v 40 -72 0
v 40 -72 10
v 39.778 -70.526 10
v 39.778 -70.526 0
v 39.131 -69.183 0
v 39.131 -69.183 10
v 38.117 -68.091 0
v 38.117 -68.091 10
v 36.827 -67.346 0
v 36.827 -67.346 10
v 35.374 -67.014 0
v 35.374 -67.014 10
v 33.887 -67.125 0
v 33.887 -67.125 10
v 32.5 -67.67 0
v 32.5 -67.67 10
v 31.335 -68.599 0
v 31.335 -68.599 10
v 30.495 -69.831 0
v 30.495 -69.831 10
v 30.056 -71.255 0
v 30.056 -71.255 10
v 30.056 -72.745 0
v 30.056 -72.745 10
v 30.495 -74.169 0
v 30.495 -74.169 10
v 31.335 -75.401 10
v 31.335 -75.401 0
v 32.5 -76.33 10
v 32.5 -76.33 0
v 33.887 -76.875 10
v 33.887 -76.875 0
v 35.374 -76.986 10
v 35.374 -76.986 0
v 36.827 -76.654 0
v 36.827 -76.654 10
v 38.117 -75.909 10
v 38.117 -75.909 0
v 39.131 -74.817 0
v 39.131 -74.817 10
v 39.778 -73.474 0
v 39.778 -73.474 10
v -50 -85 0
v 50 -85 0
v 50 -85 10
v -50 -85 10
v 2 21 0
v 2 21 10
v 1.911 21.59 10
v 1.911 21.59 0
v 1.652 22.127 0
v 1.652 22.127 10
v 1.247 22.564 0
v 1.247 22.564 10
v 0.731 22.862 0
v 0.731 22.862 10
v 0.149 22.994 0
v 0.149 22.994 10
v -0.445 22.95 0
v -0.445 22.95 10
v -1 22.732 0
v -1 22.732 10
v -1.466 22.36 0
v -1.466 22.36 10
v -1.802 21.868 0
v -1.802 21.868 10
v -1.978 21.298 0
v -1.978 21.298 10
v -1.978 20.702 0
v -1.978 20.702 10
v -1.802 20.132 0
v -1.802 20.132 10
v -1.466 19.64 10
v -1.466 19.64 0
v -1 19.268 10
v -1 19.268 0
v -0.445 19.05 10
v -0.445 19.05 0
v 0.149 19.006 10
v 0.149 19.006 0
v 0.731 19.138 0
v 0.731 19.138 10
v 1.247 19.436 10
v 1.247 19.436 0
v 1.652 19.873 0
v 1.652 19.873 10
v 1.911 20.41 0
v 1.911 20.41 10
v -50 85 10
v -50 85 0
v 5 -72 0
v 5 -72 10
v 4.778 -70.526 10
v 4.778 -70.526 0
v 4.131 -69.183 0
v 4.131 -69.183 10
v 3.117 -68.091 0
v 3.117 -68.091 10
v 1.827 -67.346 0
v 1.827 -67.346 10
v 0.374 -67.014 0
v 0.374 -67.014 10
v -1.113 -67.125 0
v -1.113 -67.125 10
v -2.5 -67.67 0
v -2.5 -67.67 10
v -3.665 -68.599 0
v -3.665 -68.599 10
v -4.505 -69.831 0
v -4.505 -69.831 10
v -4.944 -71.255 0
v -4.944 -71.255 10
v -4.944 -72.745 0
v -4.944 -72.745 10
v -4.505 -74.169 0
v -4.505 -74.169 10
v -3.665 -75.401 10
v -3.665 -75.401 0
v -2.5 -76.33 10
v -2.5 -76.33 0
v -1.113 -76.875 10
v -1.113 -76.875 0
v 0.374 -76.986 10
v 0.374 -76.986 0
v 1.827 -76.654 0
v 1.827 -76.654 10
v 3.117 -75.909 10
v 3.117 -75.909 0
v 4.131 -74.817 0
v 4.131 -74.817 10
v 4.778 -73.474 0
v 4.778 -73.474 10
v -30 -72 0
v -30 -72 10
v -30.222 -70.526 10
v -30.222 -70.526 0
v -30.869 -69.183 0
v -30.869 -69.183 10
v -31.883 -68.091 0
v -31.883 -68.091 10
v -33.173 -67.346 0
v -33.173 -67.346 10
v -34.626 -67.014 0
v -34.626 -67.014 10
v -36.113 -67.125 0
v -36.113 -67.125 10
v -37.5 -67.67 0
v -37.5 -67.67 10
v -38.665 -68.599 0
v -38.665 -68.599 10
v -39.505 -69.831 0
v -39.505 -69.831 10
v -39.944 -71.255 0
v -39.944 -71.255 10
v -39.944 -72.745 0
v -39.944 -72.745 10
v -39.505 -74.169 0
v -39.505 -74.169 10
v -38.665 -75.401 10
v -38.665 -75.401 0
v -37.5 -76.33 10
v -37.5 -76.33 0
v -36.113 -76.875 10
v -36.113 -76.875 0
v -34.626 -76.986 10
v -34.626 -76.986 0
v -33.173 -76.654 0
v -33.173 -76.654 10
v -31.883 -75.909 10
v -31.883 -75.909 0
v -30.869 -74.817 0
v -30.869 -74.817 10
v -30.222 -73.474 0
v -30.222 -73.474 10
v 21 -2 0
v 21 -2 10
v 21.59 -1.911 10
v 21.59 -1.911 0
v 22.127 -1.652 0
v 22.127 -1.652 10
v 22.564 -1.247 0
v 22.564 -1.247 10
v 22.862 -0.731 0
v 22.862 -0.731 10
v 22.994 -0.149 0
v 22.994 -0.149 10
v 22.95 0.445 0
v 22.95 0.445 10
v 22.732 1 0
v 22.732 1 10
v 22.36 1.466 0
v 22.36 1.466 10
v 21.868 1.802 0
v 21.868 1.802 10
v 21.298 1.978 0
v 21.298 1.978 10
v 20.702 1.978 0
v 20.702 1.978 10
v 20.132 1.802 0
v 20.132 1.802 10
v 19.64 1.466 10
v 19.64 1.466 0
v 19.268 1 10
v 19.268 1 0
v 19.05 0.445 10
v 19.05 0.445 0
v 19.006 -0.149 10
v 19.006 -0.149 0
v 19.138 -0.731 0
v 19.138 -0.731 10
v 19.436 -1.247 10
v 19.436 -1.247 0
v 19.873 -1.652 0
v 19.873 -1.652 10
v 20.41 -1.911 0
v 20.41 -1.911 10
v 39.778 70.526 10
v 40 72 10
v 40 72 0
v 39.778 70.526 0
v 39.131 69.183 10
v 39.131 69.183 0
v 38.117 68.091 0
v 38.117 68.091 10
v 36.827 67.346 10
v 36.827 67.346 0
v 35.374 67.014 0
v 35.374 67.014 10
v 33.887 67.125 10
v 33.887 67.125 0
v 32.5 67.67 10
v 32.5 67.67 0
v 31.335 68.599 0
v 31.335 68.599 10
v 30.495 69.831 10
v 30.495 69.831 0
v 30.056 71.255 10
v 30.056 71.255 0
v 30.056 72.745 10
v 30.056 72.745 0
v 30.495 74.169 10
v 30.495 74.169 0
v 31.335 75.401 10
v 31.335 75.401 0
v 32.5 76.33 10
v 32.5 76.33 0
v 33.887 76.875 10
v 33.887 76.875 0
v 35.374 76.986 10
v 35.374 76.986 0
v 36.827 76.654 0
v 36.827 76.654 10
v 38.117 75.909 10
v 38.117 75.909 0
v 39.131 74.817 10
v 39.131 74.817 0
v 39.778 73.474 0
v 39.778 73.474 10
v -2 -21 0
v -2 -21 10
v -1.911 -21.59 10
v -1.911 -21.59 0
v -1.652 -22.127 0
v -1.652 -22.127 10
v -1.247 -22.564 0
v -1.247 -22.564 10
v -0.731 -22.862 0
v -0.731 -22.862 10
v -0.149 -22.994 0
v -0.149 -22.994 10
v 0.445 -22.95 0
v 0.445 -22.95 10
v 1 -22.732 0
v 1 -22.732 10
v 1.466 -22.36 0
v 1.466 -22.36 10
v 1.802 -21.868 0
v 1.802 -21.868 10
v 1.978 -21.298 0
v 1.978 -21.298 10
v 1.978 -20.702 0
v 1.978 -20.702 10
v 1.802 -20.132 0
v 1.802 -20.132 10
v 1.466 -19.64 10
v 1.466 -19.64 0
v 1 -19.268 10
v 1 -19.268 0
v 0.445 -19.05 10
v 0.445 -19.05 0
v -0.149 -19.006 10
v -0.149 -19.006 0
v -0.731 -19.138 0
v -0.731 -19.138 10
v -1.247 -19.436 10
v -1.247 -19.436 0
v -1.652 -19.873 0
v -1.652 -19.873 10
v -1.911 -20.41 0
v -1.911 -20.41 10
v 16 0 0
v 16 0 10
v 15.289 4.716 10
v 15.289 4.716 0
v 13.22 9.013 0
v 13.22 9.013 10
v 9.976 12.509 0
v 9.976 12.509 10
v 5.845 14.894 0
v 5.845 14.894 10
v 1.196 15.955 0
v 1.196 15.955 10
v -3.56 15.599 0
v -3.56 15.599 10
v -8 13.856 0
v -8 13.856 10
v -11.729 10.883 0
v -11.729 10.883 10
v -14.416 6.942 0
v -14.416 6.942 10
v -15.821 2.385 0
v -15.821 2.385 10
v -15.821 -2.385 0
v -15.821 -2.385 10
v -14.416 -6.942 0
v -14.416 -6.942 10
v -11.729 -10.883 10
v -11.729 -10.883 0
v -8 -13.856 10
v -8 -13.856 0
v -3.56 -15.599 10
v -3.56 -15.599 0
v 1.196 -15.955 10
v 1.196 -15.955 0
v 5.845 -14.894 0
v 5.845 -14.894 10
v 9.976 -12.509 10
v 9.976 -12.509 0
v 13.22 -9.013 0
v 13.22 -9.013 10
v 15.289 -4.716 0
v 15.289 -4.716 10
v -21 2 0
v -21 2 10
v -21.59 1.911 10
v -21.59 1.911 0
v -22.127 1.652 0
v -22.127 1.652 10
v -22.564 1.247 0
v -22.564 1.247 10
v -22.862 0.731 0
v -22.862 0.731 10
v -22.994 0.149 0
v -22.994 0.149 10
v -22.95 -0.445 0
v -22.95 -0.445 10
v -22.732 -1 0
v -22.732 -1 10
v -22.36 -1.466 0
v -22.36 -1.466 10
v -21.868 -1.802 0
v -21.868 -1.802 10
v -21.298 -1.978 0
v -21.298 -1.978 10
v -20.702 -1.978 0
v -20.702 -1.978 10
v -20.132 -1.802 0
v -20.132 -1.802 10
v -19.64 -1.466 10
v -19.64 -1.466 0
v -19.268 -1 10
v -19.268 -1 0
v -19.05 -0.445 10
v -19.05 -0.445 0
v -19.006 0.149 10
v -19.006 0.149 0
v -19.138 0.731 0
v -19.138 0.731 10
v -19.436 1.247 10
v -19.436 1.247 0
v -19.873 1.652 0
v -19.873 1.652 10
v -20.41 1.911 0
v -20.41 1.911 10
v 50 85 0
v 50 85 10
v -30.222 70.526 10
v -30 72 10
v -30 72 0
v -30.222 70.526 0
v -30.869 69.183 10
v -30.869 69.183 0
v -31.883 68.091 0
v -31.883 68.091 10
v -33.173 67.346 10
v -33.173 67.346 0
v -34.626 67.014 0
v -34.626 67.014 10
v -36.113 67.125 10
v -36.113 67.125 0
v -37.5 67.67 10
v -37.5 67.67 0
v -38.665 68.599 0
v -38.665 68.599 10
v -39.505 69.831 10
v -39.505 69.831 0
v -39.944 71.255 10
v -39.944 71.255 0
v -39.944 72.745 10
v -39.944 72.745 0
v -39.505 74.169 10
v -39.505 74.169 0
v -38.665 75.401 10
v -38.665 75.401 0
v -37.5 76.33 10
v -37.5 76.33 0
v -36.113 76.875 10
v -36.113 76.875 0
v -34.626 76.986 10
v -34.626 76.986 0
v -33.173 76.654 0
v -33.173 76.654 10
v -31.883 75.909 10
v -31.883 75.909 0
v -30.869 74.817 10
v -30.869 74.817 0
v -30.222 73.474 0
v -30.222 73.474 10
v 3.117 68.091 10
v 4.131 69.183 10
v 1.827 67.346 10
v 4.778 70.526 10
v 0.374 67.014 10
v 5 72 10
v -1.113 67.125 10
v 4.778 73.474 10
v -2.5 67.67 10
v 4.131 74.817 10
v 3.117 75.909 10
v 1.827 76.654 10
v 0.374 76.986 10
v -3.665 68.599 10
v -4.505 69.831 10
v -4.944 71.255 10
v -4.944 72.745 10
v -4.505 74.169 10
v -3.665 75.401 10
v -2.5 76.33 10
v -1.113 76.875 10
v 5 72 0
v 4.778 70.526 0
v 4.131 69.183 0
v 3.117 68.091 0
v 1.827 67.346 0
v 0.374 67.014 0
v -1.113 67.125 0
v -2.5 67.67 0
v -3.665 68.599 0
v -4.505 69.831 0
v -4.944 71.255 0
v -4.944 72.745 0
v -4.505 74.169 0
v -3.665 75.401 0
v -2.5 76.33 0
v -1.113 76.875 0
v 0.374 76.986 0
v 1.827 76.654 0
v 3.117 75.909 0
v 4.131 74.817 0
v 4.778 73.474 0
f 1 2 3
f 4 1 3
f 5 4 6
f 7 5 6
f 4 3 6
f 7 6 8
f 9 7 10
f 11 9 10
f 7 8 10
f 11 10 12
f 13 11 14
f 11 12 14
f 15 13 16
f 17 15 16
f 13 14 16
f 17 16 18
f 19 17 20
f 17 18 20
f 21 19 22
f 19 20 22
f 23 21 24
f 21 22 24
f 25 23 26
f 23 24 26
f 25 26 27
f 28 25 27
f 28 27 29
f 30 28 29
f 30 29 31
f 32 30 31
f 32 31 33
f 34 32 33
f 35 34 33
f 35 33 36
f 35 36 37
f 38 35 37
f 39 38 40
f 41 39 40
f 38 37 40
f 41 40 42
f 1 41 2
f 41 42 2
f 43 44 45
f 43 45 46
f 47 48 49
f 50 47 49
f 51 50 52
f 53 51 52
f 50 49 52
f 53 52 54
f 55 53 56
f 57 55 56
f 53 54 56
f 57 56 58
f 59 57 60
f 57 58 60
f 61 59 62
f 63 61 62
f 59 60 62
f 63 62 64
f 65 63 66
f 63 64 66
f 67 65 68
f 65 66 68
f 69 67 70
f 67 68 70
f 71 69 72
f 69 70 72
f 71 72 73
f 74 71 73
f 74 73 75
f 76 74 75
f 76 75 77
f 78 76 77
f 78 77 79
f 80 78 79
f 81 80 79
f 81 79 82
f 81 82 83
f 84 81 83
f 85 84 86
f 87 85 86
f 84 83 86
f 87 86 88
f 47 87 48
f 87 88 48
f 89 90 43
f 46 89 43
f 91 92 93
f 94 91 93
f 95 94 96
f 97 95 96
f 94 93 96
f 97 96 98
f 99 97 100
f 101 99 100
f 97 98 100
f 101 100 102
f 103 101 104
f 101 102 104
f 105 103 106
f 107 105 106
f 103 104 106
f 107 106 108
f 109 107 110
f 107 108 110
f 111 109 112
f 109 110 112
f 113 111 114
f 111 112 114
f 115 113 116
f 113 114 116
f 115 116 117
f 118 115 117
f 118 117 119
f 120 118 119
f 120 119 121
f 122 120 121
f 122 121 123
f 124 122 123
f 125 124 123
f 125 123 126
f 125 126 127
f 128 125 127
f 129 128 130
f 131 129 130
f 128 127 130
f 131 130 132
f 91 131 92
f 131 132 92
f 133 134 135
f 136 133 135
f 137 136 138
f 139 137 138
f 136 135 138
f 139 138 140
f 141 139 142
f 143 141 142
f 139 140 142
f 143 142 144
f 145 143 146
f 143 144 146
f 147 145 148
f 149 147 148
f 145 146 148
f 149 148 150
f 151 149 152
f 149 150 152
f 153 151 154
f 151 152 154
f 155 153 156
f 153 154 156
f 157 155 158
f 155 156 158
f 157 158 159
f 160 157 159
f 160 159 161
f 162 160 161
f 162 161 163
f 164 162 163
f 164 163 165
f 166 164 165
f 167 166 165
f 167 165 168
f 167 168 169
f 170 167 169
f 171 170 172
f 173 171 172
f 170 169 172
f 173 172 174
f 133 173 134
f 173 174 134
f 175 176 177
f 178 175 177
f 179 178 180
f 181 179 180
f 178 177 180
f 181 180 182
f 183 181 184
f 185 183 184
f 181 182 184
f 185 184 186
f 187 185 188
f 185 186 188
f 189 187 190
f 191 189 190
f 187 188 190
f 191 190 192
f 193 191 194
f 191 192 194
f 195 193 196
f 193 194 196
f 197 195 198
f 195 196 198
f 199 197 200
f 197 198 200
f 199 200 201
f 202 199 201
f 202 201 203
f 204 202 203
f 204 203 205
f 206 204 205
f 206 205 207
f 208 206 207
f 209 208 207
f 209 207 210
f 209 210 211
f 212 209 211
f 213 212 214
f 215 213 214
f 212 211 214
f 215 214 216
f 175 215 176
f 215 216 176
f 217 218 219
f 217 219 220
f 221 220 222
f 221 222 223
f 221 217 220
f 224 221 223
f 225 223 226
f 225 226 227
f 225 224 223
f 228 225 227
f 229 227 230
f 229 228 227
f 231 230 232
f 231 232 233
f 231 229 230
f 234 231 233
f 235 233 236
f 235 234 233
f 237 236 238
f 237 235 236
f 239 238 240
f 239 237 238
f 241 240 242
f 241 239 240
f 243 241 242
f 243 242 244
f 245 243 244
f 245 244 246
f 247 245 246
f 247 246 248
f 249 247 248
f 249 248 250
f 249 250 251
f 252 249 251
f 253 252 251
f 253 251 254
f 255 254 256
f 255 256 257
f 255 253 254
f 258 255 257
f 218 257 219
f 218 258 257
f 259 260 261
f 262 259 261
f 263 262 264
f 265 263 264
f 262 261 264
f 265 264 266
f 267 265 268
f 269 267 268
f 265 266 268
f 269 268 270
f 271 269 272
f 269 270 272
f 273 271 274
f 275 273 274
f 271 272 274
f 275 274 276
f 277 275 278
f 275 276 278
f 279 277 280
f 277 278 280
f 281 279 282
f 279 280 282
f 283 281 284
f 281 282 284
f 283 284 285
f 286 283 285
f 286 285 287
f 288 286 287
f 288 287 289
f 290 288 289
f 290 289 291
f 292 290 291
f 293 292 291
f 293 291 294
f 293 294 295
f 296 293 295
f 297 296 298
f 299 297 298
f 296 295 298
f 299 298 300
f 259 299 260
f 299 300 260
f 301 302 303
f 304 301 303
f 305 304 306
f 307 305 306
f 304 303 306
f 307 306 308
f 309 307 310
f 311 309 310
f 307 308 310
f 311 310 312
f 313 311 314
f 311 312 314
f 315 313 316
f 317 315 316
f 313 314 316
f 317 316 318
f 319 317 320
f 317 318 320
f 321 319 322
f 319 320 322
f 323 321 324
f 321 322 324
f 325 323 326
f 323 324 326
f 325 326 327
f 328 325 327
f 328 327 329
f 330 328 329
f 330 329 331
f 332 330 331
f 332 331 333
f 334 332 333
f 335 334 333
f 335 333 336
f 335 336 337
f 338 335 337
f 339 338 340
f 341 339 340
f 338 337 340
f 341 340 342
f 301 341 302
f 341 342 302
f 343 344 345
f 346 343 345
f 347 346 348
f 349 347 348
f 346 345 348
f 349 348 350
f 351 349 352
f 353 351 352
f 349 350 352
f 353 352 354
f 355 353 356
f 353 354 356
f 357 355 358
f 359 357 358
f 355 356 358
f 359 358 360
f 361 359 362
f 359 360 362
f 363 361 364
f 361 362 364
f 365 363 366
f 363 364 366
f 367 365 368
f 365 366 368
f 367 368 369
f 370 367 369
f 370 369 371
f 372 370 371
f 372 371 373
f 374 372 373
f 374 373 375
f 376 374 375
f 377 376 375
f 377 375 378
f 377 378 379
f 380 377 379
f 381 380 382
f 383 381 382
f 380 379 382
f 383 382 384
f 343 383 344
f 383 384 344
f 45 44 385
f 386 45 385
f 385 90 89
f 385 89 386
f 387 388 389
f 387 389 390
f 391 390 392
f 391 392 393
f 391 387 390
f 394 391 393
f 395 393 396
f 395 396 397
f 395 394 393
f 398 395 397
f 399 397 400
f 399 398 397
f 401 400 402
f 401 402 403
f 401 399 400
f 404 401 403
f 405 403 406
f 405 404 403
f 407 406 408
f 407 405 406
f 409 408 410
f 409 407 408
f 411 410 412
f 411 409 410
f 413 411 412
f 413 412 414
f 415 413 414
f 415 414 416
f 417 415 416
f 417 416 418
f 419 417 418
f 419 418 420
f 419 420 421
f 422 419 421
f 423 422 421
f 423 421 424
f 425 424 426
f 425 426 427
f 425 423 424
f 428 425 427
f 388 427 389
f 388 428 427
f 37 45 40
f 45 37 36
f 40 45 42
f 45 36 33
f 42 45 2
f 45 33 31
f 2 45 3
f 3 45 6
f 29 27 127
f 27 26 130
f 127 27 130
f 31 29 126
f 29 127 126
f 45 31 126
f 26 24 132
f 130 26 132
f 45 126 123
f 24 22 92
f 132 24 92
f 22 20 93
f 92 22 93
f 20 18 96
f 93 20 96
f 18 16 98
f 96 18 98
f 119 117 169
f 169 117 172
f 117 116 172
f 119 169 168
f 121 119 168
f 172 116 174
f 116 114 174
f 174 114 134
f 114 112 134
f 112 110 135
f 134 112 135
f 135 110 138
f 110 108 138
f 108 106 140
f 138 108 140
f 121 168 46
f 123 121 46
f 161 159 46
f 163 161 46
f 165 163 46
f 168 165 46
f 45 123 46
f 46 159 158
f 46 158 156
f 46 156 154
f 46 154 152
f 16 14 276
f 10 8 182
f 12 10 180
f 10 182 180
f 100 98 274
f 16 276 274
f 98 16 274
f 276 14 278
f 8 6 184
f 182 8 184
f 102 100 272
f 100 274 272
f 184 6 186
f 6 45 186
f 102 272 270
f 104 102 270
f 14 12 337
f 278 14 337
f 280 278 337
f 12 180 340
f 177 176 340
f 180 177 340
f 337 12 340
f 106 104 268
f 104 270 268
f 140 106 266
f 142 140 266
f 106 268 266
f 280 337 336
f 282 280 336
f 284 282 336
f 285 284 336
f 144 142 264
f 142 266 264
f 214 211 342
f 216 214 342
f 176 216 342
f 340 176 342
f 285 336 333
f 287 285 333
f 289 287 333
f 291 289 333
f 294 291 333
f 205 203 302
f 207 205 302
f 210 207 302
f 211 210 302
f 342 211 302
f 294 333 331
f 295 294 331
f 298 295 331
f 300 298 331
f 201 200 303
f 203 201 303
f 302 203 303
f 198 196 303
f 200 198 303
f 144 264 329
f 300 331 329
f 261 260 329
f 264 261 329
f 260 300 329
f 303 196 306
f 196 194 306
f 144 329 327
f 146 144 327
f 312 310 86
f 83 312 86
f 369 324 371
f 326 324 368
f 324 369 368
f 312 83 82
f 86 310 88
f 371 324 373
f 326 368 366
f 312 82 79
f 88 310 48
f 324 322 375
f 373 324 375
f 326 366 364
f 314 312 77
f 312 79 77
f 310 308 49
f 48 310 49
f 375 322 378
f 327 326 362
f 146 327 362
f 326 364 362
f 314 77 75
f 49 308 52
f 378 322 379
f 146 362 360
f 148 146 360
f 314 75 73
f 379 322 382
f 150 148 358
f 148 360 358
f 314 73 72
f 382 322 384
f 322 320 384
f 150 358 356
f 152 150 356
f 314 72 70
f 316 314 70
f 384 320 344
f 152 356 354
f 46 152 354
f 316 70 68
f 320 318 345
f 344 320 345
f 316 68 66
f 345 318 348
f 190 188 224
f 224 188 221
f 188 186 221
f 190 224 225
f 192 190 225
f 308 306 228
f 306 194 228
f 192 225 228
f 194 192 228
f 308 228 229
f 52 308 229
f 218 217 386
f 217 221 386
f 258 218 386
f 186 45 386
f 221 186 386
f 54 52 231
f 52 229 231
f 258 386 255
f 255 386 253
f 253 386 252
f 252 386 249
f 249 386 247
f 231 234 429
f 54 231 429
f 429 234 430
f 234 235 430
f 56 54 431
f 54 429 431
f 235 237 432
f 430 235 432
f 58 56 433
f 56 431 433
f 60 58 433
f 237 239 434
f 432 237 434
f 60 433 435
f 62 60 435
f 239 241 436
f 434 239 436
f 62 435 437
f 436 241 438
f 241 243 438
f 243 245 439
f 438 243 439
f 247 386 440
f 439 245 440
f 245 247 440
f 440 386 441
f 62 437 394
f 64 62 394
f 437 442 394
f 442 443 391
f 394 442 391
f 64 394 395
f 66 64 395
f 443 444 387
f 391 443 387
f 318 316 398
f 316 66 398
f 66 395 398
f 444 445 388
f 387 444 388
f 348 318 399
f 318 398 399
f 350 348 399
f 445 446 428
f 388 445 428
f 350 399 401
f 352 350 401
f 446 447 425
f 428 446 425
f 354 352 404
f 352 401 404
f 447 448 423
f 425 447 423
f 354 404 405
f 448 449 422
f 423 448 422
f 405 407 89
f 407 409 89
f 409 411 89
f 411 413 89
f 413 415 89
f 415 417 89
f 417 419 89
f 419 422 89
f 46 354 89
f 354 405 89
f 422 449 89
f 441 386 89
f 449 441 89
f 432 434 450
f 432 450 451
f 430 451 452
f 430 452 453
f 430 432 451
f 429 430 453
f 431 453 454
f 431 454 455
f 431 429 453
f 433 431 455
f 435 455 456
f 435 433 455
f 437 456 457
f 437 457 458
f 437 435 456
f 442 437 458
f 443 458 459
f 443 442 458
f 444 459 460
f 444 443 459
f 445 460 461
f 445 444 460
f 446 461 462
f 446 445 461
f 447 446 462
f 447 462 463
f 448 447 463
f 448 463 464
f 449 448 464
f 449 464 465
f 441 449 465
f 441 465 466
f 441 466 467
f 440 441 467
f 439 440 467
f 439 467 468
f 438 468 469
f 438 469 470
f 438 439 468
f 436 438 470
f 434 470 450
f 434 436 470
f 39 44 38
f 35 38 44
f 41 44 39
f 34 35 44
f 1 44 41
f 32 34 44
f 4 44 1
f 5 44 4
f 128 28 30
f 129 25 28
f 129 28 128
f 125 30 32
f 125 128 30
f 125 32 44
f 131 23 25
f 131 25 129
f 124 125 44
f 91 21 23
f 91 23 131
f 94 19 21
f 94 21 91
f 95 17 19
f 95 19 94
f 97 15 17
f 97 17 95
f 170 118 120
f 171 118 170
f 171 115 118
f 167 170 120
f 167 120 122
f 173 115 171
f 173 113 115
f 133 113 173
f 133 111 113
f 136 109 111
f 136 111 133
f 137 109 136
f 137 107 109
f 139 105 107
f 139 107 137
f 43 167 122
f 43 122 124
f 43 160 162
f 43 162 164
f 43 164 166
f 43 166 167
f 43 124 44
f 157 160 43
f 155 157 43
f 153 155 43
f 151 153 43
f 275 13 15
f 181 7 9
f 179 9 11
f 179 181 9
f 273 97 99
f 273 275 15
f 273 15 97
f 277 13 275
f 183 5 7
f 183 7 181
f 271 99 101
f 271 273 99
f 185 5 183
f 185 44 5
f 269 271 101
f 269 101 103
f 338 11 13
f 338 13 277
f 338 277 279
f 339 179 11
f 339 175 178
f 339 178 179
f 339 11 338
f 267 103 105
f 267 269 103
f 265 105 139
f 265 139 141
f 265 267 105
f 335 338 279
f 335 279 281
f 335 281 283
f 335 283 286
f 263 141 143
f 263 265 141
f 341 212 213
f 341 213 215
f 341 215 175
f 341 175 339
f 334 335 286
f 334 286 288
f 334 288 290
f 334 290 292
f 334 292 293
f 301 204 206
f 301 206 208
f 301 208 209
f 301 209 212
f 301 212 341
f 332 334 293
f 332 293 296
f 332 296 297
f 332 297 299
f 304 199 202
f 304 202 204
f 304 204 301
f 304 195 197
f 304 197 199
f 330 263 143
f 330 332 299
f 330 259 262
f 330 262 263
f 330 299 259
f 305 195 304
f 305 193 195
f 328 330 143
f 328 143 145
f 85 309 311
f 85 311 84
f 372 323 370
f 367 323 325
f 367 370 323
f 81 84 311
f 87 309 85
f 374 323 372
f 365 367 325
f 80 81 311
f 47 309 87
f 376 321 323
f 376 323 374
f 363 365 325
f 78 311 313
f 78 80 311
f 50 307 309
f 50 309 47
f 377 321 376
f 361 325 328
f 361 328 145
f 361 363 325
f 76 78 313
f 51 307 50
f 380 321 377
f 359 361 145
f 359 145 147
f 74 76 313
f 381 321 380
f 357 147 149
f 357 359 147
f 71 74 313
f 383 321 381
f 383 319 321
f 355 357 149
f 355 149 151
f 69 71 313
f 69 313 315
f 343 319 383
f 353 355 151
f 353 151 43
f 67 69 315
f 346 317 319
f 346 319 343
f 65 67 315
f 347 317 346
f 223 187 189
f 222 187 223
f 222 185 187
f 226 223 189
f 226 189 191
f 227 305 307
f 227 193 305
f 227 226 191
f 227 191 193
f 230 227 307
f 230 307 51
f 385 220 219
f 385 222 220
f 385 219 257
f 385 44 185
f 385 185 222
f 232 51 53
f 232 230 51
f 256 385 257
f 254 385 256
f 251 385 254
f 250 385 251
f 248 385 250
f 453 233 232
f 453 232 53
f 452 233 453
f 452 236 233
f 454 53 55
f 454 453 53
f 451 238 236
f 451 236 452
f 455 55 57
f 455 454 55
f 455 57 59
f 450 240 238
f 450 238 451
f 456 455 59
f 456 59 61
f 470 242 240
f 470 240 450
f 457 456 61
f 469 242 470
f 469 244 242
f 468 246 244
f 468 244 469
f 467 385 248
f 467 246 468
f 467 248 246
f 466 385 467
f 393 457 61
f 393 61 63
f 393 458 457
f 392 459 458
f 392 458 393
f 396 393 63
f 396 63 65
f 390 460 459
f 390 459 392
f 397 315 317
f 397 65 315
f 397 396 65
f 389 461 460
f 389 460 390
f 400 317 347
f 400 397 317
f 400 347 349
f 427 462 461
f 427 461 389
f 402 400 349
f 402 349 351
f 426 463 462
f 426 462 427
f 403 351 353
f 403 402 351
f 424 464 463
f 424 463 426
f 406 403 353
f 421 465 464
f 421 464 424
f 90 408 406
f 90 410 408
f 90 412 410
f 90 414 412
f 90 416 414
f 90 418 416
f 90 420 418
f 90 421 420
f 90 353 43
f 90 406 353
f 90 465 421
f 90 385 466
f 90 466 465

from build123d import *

# Parameters (mm, degrees)
EXTRUDE_1_DEPTH          = 10
SKETCH_2_R               = 16
CUT_EXTRUDE_1_DEPTH      = 10
SKETCH_3_R               = 5
CUT_EXTRUDE_2_DEPTH      = 10
SKETCH_6_R               = 2
CUT_EXTRUDE_4_DEPTH      = 10
PATTERN_CIRCULAR_1_COUNT = 4


with BuildPart() as part:
    # 草图1 → 凸台-拉伸1 (new body)
    with BuildSketch(Plane.XY):
        Polygon((50, -85), (-50, -85), (-50, -40), (-50, 85), (50, 85), (50, 0), align=None)
    extrude(amount=EXTRUDE_1_DEPTH)

    # 草图2 → 切除-拉伸1 (cut)
    with BuildSketch(Plane.XY.offset(10)):
        Circle(SKETCH_2_R)
    extrude(amount=-CUT_EXTRUDE_1_DEPTH, mode=Mode.SUBTRACT)

    # 草图3 → 切除-拉伸2 (cut)
    with BuildSketch(Plane.XY.offset(10)):
        with Locations((0, -72)):
            Circle(SKETCH_3_R)
        with Locations((35, -72)):
            Circle(SKETCH_3_R)
        with Locations((-35, -72)):
            Circle(SKETCH_3_R)
    cut_extrude_2 = extrude(amount=-CUT_EXTRUDE_2_DEPTH, mode=Mode.SUBTRACT)

    # 草图6 → 切除-拉伸4 (cut)
    with BuildSketch(Plane.XY.offset(10)):
        with Locations((0, 21)):
            Circle(SKETCH_6_R)
    cut_extrude_4 = extrude(amount=-CUT_EXTRUDE_4_DEPTH, mode=Mode.SUBTRACT)

    # 阵列(圆周)1: 切除-拉伸4 ×4 about axis
    pattern_circular_1_axis = Axis((0, 0, 0), (0, 0, 1))
    for i in range(1, PATTERN_CIRCULAR_1_COUNT):
        add(cut_extrude_4.rotate(pattern_circular_1_axis, i * 360 / PATTERN_CIRCULAR_1_COUNT), mode=Mode.SUBTRACT)

    # 镜向1: 切除-拉伸2 across plane
    add(cut_extrude_2.mirror(Plane.ZX), mode=Mode.SUBTRACT)


solid = part.part
